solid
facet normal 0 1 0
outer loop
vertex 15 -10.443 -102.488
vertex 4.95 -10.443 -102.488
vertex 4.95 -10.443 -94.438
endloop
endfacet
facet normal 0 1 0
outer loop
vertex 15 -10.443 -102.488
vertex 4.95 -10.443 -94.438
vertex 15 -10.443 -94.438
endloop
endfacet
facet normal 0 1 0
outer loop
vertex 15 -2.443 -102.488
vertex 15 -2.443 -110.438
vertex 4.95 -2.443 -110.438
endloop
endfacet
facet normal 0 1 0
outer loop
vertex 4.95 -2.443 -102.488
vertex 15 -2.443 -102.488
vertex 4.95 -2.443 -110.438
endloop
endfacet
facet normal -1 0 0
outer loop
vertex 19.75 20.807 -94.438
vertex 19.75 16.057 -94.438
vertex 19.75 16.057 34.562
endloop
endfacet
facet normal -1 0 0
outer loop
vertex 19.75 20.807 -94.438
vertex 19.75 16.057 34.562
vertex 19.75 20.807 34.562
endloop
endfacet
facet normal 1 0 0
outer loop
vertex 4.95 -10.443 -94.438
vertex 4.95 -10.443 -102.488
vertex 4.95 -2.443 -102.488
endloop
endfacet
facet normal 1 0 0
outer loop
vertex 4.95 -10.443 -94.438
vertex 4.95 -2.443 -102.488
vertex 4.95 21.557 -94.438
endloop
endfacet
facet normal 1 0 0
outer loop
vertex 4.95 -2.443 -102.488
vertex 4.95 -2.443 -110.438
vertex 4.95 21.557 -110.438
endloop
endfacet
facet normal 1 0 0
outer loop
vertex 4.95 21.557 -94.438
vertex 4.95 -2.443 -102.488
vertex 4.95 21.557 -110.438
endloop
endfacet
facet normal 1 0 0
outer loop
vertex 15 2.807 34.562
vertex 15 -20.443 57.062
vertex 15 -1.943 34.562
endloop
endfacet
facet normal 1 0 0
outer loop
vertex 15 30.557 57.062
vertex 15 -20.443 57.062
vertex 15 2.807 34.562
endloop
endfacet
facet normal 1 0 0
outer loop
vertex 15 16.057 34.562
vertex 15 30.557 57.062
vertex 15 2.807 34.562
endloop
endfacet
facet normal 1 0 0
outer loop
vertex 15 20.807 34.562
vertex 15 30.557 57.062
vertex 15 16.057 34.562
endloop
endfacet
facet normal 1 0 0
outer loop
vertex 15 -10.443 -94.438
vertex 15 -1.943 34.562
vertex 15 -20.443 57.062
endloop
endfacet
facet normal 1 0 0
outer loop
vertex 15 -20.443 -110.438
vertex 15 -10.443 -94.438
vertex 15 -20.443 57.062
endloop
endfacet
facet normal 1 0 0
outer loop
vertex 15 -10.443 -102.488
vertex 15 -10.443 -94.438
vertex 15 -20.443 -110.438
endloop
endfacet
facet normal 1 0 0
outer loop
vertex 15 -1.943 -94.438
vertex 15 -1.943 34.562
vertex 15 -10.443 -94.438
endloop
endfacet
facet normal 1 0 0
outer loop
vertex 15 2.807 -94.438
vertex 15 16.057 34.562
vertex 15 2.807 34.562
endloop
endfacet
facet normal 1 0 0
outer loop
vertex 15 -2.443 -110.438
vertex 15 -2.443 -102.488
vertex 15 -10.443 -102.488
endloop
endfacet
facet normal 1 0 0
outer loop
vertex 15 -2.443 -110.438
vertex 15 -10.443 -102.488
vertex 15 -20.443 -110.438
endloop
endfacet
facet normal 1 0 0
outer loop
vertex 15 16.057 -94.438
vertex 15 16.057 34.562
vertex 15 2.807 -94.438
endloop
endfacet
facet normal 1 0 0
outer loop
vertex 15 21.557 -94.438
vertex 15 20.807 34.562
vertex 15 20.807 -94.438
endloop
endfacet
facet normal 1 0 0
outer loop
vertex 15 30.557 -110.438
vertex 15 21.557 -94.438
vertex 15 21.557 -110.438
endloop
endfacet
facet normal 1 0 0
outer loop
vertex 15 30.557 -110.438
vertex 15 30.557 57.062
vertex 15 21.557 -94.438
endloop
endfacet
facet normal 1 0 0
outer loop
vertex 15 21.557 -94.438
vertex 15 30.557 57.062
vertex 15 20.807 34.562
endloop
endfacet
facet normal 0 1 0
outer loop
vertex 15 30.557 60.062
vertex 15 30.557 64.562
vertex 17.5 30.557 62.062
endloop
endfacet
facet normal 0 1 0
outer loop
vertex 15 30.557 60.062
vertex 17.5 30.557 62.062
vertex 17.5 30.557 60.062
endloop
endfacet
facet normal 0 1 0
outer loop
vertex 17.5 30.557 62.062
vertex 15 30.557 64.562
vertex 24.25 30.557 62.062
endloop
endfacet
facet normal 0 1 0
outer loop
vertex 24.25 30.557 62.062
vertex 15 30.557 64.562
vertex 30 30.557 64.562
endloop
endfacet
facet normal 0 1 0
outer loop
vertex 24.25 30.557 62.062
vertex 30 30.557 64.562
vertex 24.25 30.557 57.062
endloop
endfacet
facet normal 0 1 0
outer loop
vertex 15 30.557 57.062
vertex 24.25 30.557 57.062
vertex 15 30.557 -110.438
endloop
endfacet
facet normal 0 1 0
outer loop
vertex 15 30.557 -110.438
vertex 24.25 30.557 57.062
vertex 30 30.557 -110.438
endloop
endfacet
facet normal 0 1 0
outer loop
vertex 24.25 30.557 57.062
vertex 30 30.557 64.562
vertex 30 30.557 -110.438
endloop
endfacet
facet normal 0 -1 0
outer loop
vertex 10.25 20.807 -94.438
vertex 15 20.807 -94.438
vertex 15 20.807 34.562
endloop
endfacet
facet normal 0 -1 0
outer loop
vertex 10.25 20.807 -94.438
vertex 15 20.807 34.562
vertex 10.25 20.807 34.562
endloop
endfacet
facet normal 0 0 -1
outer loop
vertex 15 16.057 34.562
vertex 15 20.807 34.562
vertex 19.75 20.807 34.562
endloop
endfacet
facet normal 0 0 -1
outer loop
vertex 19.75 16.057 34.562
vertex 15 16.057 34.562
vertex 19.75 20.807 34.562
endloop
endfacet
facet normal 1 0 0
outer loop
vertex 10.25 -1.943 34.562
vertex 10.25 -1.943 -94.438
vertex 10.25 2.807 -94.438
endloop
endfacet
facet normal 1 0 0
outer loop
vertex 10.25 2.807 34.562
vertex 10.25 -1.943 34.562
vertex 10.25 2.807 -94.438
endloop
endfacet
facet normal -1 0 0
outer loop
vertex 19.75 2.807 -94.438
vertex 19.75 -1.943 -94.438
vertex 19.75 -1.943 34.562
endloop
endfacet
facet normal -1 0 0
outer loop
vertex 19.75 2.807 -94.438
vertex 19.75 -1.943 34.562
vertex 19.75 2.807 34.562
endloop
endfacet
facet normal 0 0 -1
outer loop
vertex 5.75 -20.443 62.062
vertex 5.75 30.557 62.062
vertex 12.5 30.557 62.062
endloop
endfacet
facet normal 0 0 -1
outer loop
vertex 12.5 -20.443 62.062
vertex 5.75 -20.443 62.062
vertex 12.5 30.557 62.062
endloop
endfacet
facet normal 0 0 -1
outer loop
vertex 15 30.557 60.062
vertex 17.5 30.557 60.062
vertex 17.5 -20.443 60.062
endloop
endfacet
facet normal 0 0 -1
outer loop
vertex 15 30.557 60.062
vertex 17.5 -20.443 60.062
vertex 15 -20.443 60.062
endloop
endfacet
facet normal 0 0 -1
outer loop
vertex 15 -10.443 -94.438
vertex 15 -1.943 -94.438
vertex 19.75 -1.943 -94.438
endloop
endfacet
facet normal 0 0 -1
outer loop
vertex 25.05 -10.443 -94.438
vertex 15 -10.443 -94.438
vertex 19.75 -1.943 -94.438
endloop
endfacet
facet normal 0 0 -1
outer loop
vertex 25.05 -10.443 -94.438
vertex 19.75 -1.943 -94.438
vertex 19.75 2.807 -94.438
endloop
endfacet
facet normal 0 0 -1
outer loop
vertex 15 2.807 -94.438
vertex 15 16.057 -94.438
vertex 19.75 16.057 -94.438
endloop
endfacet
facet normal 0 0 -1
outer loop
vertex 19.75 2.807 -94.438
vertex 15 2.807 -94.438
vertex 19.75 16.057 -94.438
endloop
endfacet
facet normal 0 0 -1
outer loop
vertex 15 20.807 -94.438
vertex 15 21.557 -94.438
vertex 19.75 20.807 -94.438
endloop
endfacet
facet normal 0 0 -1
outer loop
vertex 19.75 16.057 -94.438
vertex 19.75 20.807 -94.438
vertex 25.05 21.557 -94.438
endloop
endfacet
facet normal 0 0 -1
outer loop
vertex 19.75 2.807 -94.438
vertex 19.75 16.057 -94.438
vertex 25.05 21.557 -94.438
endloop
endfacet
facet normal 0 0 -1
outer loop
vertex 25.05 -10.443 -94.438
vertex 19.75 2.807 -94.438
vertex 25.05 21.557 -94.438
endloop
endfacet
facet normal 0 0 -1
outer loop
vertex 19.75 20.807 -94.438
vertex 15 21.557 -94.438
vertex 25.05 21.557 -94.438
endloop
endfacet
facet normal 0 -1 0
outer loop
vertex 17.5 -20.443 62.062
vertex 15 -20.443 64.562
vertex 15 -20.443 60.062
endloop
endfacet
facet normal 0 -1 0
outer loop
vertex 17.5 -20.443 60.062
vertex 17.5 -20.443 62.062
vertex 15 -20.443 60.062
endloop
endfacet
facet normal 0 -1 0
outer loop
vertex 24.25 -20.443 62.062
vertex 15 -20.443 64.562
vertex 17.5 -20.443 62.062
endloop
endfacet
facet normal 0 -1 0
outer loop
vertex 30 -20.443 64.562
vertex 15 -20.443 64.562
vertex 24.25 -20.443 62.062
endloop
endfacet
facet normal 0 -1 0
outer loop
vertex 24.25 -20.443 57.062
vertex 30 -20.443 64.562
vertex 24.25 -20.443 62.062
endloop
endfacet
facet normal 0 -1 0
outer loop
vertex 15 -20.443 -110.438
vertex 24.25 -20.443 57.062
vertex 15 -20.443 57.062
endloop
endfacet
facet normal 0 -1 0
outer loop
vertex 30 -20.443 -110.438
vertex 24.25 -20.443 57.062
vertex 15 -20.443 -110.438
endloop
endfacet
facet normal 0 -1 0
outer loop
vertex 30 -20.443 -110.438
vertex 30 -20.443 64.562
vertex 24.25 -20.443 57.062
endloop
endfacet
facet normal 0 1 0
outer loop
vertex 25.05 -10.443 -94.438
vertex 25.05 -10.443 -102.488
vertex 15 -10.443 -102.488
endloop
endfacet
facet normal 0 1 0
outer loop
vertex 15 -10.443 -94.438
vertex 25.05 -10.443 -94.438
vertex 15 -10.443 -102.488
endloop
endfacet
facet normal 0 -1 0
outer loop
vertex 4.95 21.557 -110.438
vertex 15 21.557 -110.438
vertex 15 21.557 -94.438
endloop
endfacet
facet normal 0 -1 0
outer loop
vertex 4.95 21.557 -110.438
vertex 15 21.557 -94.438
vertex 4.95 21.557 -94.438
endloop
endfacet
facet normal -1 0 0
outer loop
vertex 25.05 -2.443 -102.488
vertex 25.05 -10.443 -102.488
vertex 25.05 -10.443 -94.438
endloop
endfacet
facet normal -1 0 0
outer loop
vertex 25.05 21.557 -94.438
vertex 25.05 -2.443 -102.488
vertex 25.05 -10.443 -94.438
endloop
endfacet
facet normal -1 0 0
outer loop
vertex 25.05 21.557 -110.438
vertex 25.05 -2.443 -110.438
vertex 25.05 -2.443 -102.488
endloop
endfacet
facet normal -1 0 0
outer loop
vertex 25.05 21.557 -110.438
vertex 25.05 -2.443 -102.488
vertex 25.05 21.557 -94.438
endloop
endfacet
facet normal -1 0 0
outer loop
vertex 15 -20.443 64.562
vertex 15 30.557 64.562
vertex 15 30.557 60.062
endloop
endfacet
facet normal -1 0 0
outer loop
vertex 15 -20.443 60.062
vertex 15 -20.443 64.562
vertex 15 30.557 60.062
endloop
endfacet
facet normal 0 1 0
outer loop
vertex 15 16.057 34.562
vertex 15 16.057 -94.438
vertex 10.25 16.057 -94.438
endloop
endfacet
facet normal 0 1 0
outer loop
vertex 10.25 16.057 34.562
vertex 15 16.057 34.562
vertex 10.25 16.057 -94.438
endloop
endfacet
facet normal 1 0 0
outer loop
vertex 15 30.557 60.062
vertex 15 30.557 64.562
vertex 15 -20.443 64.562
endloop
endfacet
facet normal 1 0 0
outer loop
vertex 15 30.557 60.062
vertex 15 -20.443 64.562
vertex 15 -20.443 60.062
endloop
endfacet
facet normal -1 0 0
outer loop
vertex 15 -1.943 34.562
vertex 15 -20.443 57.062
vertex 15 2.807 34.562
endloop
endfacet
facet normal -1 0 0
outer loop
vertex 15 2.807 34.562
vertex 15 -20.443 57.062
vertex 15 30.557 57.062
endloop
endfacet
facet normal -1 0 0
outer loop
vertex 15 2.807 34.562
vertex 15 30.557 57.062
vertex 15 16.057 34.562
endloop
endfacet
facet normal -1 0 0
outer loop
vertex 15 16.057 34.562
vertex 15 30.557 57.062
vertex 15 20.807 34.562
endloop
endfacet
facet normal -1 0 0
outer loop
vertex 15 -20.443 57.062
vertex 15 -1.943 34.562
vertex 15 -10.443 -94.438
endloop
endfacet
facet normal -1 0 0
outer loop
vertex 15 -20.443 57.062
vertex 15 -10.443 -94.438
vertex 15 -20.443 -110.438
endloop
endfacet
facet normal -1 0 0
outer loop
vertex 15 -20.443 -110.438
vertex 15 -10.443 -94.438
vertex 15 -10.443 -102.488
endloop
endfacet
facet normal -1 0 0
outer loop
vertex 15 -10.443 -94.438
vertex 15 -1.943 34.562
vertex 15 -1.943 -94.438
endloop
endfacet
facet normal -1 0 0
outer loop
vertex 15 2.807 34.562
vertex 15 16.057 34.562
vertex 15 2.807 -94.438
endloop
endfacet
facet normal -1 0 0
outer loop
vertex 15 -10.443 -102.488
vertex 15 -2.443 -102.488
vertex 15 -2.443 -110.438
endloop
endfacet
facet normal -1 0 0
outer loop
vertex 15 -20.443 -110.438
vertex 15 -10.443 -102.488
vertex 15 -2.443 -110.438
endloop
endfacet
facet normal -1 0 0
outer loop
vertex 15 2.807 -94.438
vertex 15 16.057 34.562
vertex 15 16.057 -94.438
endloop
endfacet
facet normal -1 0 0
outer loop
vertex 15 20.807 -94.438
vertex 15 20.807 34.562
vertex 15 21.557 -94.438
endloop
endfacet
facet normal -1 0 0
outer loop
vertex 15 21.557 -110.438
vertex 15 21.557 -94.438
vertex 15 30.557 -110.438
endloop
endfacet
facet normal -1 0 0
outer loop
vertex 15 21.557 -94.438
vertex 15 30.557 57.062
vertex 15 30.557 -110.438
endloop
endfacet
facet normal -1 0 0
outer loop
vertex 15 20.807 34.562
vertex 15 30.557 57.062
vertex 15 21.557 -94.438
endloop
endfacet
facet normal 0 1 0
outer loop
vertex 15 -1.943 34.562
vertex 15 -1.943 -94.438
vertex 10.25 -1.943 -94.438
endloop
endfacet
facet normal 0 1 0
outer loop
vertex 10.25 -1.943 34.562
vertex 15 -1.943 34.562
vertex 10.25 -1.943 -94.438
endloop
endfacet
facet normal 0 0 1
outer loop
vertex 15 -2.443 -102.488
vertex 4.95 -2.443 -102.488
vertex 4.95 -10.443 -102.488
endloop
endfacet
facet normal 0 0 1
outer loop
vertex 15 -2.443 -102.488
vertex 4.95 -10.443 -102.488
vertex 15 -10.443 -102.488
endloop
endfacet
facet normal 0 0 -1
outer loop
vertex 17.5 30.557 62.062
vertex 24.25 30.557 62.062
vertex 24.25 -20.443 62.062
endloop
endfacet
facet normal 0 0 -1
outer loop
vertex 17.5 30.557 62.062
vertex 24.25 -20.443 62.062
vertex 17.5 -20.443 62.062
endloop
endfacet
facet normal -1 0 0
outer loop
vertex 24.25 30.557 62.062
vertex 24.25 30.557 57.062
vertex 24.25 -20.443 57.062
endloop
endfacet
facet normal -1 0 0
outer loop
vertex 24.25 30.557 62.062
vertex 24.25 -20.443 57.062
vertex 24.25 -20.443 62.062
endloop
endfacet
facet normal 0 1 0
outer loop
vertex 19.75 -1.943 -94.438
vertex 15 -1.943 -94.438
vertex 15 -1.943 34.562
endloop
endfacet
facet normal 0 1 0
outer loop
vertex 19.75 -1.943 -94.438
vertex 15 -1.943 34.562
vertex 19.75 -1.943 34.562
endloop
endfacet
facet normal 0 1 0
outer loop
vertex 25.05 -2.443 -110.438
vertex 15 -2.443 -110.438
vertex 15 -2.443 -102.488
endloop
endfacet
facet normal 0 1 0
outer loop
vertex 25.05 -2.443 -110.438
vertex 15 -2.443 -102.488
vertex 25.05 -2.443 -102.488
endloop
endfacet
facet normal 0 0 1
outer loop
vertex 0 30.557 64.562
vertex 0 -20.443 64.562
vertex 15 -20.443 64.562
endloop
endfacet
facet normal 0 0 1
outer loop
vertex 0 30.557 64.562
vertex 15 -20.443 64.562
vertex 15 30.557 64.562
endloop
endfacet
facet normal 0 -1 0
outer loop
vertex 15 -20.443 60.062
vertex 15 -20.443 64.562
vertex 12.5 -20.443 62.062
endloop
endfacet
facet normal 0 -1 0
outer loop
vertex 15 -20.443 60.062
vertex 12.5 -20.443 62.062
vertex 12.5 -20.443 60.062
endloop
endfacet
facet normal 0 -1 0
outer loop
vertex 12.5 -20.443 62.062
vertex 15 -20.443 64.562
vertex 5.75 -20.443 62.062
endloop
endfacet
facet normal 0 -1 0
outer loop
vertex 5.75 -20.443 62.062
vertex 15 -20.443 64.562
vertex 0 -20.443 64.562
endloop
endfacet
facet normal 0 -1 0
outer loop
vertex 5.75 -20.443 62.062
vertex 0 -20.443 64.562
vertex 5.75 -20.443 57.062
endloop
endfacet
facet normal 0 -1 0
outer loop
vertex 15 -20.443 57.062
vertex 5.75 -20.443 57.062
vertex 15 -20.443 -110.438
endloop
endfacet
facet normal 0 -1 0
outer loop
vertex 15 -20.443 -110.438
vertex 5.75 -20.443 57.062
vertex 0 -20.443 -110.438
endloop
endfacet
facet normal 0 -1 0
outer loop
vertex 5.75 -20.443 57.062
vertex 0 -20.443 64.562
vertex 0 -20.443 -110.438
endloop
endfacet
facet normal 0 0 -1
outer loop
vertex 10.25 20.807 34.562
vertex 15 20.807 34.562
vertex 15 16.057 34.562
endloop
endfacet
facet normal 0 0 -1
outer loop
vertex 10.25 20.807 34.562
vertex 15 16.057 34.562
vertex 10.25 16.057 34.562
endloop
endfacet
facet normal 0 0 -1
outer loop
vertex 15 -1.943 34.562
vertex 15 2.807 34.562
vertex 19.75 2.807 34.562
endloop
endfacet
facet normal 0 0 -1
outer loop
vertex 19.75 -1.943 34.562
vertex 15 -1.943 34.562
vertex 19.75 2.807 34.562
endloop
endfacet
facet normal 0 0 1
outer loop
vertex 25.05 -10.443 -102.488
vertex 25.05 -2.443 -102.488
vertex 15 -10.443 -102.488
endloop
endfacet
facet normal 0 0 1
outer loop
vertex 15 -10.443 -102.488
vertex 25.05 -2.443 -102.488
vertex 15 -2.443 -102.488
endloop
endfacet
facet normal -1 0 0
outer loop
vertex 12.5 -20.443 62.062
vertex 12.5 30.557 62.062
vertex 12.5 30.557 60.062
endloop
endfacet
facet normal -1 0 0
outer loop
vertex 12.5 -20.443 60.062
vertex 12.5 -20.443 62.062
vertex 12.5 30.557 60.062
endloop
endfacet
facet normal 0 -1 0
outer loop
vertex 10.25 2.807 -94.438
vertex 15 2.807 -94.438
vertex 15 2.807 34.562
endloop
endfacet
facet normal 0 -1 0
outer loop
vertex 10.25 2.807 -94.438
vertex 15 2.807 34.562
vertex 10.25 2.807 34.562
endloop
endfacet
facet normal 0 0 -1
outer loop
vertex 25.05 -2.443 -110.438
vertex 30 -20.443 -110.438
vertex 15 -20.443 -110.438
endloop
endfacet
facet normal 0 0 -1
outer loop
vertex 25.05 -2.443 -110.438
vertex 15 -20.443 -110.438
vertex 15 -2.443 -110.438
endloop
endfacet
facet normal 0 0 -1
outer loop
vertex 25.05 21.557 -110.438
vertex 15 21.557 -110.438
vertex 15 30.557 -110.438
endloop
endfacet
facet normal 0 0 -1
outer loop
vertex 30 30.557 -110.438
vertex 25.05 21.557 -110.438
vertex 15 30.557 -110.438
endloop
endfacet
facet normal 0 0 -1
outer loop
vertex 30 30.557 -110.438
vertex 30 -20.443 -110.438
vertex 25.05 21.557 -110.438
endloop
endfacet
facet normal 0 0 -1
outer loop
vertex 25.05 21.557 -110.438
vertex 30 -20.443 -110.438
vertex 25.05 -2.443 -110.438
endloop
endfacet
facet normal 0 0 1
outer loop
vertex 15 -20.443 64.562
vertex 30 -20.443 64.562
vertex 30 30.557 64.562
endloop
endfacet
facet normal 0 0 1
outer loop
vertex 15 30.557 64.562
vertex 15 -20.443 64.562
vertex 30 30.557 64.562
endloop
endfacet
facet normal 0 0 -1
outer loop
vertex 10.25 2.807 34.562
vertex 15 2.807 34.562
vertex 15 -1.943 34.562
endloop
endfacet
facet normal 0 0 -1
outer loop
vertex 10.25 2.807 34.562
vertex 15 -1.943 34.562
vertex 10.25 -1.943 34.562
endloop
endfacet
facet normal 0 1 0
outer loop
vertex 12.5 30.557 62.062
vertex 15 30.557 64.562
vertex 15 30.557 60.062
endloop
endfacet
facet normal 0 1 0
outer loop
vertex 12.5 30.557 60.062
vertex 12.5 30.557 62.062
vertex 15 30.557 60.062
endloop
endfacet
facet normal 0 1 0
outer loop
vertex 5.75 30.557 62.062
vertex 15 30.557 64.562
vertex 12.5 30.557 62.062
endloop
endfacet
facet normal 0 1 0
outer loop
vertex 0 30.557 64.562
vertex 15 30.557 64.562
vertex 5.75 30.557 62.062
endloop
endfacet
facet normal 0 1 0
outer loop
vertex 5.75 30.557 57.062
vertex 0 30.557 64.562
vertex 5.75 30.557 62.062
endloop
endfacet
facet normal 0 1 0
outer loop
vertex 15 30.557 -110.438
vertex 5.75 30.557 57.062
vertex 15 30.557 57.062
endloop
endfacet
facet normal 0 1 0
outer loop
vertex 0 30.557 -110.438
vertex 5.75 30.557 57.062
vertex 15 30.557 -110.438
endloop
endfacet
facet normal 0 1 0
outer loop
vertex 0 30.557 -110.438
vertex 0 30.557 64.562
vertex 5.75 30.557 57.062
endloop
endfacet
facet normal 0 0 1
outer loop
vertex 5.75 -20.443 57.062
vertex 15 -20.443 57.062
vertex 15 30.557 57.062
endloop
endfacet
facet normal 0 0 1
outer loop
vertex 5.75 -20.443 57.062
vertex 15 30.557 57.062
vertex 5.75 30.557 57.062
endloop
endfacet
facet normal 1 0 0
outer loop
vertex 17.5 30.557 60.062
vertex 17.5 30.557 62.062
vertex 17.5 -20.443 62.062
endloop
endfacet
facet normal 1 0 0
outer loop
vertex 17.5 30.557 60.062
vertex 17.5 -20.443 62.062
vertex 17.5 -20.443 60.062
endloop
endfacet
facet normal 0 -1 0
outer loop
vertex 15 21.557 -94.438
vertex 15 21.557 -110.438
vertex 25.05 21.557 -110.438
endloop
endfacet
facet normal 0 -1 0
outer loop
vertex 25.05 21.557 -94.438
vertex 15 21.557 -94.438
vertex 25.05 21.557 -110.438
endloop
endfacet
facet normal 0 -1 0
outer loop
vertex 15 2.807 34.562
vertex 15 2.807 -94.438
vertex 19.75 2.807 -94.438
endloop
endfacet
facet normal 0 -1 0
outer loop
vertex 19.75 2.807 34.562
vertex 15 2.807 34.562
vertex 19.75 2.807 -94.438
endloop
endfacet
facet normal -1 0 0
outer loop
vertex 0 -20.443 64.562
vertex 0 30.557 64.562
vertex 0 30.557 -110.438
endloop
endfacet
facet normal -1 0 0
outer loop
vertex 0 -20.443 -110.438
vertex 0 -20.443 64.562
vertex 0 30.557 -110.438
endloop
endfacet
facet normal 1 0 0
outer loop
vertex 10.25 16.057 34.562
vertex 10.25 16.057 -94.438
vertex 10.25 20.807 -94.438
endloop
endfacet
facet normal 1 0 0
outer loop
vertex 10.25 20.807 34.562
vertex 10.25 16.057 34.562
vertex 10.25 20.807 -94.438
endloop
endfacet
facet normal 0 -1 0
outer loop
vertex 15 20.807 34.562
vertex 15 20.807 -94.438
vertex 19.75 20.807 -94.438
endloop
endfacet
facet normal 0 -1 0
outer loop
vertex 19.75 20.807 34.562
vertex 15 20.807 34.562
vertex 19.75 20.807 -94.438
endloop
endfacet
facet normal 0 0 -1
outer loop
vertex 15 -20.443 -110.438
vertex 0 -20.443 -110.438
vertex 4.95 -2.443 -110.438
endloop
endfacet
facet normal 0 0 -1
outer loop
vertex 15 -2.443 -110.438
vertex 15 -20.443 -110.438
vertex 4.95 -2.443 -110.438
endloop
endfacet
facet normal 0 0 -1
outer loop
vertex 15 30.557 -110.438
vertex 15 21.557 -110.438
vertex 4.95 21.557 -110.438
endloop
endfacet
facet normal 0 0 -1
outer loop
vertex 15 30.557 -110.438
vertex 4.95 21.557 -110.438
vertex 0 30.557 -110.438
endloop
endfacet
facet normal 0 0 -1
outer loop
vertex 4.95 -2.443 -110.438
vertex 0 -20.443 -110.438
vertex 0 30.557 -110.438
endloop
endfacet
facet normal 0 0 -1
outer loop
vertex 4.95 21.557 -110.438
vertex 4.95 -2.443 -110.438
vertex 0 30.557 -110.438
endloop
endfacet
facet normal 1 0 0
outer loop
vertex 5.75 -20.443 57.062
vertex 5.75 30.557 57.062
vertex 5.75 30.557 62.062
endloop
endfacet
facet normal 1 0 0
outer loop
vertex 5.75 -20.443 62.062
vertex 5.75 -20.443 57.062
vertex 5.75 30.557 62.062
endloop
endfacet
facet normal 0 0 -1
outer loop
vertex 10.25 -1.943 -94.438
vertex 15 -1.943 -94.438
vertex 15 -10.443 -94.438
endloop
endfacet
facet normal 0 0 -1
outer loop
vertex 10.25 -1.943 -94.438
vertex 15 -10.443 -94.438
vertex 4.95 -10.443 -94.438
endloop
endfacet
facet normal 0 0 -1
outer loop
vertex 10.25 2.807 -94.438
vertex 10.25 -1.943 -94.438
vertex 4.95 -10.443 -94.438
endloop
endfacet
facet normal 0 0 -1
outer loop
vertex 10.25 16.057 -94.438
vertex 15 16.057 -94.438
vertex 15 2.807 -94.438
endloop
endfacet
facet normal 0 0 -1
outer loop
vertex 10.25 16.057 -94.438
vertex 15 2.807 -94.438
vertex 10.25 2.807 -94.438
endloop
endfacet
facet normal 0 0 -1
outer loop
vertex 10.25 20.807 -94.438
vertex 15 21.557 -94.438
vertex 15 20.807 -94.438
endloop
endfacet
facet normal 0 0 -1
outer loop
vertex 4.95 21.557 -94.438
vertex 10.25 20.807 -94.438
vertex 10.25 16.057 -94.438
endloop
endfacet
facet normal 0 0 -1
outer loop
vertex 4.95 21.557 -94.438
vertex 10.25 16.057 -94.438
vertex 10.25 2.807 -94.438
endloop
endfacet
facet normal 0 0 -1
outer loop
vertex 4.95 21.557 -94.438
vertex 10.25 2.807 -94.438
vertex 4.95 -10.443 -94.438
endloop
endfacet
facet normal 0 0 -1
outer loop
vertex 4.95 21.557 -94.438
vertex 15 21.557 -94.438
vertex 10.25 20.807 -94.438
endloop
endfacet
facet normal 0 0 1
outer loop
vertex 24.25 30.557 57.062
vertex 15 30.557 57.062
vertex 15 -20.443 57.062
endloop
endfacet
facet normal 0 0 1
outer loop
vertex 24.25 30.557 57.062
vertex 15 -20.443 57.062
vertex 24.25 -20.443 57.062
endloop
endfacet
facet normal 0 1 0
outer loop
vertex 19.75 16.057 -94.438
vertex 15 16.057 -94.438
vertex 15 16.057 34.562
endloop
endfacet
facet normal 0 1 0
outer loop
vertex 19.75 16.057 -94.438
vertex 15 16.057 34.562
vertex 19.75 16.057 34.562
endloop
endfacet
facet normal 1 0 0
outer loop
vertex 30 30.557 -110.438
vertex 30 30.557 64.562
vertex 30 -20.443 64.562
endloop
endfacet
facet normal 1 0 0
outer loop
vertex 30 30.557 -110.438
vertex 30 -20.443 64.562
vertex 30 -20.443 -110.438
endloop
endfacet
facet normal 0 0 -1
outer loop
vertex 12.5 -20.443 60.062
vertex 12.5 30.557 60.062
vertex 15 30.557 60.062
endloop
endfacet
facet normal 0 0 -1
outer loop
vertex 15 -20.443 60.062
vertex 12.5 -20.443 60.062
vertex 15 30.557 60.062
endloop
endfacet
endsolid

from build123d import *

# Parameters (mm, degrees)
SKETCH1_W           = 175
SKETCH1_H           = 51
BOSS_EXTRUDE1_DEPTH = 15
CUT_EXTRUDE3_DEPTH  = 52
SKETCH7_W           = 4.75
SKETCH7_H           = 4.75
CUT_EXTRUDE5_DEPTH  = 145
SKETCH10_W          = 10.05
SKETCH10_H          = 24
CUT_EXTRUDE6_DEPTH  = 16
SKETCH11_W          = 10.05
SKETCH11_H          = 8.05
CUT_EXTRUDE7_DEPTH  = 8


with BuildPart() as part:
    # Sketch1 → Boss-Extrude1 (new body)
    with BuildSketch(Plane(origin=(0, 0, 0), x_dir=(0, 0, -1), z_dir=(1, 0, 0))):
        with Locations((22.937921078, 5.057266603)):
            Rectangle(SKETCH1_W, SKETCH1_H)
    extrude(amount=BOSS_EXTRUDE1_DEPTH)

    # Sketch6 → Cut-Extrude3 (cut, through all)
    with BuildSketch(Plane(origin=(0, 30.557266603, 0), x_dir=(1, 0, 0), z_dir=(0, 1, 0))):
        Polygon((12.5, -60.062078922), (15, -60.062078922), (15, -57.062078922), (12.5, -57.062078922), (5.75, -57.062078922), (5.75, -62.062078922), (12.5, -62.062078922), align=None)
    extrude(amount=-CUT_EXTRUDE3_DEPTH, mode=Mode.SUBTRACT)

    # Sketch7 → Cut-Extrude5 (cut)
    with BuildSketch(Plane(origin=(0, 0, -110.437921078), x_dir=(-1, 0, 0), z_dir=(0, 0, -1))):
        with Locations((-12.625, 0.432266603)):
            Rectangle(SKETCH7_W, SKETCH7_H)
        with Locations((-12.625, 18.432266603)):
            Rectangle(SKETCH7_W, SKETCH7_H)
    extrude(amount=-CUT_EXTRUDE5_DEPTH, mode=Mode.SUBTRACT)

    # Sketch10 → Cut-Extrude6 (cut)
    with BuildSketch(Plane(origin=(0, 0, -110.437921078), x_dir=(-1, 0, 0), z_dir=(0, 0, -1))):
        with Locations((-9.975, 9.557266603)):
            Rectangle(SKETCH10_W, SKETCH10_H)
    extrude(amount=-CUT_EXTRUDE6_DEPTH, mode=Mode.SUBTRACT)

    # Sketch11 → Cut-Extrude7 (cut)
    with BuildSketch(Plane(origin=(0, -2.442733397, 0), x_dir=(1, 0, 0), z_dir=(0, 1, 0))):
        with Locations((9.975, 98.462921078)):
            Rectangle(SKETCH11_W, SKETCH11_H)
    extrude(amount=-CUT_EXTRUDE7_DEPTH, mode=Mode.SUBTRACT)


with BuildPart() as body_2:
    # Mirror4: mirrored copy
    add(part.part.mirror(Plane.ZY.offset(-15)))


solid = Compound([part.part, body_2.part])
